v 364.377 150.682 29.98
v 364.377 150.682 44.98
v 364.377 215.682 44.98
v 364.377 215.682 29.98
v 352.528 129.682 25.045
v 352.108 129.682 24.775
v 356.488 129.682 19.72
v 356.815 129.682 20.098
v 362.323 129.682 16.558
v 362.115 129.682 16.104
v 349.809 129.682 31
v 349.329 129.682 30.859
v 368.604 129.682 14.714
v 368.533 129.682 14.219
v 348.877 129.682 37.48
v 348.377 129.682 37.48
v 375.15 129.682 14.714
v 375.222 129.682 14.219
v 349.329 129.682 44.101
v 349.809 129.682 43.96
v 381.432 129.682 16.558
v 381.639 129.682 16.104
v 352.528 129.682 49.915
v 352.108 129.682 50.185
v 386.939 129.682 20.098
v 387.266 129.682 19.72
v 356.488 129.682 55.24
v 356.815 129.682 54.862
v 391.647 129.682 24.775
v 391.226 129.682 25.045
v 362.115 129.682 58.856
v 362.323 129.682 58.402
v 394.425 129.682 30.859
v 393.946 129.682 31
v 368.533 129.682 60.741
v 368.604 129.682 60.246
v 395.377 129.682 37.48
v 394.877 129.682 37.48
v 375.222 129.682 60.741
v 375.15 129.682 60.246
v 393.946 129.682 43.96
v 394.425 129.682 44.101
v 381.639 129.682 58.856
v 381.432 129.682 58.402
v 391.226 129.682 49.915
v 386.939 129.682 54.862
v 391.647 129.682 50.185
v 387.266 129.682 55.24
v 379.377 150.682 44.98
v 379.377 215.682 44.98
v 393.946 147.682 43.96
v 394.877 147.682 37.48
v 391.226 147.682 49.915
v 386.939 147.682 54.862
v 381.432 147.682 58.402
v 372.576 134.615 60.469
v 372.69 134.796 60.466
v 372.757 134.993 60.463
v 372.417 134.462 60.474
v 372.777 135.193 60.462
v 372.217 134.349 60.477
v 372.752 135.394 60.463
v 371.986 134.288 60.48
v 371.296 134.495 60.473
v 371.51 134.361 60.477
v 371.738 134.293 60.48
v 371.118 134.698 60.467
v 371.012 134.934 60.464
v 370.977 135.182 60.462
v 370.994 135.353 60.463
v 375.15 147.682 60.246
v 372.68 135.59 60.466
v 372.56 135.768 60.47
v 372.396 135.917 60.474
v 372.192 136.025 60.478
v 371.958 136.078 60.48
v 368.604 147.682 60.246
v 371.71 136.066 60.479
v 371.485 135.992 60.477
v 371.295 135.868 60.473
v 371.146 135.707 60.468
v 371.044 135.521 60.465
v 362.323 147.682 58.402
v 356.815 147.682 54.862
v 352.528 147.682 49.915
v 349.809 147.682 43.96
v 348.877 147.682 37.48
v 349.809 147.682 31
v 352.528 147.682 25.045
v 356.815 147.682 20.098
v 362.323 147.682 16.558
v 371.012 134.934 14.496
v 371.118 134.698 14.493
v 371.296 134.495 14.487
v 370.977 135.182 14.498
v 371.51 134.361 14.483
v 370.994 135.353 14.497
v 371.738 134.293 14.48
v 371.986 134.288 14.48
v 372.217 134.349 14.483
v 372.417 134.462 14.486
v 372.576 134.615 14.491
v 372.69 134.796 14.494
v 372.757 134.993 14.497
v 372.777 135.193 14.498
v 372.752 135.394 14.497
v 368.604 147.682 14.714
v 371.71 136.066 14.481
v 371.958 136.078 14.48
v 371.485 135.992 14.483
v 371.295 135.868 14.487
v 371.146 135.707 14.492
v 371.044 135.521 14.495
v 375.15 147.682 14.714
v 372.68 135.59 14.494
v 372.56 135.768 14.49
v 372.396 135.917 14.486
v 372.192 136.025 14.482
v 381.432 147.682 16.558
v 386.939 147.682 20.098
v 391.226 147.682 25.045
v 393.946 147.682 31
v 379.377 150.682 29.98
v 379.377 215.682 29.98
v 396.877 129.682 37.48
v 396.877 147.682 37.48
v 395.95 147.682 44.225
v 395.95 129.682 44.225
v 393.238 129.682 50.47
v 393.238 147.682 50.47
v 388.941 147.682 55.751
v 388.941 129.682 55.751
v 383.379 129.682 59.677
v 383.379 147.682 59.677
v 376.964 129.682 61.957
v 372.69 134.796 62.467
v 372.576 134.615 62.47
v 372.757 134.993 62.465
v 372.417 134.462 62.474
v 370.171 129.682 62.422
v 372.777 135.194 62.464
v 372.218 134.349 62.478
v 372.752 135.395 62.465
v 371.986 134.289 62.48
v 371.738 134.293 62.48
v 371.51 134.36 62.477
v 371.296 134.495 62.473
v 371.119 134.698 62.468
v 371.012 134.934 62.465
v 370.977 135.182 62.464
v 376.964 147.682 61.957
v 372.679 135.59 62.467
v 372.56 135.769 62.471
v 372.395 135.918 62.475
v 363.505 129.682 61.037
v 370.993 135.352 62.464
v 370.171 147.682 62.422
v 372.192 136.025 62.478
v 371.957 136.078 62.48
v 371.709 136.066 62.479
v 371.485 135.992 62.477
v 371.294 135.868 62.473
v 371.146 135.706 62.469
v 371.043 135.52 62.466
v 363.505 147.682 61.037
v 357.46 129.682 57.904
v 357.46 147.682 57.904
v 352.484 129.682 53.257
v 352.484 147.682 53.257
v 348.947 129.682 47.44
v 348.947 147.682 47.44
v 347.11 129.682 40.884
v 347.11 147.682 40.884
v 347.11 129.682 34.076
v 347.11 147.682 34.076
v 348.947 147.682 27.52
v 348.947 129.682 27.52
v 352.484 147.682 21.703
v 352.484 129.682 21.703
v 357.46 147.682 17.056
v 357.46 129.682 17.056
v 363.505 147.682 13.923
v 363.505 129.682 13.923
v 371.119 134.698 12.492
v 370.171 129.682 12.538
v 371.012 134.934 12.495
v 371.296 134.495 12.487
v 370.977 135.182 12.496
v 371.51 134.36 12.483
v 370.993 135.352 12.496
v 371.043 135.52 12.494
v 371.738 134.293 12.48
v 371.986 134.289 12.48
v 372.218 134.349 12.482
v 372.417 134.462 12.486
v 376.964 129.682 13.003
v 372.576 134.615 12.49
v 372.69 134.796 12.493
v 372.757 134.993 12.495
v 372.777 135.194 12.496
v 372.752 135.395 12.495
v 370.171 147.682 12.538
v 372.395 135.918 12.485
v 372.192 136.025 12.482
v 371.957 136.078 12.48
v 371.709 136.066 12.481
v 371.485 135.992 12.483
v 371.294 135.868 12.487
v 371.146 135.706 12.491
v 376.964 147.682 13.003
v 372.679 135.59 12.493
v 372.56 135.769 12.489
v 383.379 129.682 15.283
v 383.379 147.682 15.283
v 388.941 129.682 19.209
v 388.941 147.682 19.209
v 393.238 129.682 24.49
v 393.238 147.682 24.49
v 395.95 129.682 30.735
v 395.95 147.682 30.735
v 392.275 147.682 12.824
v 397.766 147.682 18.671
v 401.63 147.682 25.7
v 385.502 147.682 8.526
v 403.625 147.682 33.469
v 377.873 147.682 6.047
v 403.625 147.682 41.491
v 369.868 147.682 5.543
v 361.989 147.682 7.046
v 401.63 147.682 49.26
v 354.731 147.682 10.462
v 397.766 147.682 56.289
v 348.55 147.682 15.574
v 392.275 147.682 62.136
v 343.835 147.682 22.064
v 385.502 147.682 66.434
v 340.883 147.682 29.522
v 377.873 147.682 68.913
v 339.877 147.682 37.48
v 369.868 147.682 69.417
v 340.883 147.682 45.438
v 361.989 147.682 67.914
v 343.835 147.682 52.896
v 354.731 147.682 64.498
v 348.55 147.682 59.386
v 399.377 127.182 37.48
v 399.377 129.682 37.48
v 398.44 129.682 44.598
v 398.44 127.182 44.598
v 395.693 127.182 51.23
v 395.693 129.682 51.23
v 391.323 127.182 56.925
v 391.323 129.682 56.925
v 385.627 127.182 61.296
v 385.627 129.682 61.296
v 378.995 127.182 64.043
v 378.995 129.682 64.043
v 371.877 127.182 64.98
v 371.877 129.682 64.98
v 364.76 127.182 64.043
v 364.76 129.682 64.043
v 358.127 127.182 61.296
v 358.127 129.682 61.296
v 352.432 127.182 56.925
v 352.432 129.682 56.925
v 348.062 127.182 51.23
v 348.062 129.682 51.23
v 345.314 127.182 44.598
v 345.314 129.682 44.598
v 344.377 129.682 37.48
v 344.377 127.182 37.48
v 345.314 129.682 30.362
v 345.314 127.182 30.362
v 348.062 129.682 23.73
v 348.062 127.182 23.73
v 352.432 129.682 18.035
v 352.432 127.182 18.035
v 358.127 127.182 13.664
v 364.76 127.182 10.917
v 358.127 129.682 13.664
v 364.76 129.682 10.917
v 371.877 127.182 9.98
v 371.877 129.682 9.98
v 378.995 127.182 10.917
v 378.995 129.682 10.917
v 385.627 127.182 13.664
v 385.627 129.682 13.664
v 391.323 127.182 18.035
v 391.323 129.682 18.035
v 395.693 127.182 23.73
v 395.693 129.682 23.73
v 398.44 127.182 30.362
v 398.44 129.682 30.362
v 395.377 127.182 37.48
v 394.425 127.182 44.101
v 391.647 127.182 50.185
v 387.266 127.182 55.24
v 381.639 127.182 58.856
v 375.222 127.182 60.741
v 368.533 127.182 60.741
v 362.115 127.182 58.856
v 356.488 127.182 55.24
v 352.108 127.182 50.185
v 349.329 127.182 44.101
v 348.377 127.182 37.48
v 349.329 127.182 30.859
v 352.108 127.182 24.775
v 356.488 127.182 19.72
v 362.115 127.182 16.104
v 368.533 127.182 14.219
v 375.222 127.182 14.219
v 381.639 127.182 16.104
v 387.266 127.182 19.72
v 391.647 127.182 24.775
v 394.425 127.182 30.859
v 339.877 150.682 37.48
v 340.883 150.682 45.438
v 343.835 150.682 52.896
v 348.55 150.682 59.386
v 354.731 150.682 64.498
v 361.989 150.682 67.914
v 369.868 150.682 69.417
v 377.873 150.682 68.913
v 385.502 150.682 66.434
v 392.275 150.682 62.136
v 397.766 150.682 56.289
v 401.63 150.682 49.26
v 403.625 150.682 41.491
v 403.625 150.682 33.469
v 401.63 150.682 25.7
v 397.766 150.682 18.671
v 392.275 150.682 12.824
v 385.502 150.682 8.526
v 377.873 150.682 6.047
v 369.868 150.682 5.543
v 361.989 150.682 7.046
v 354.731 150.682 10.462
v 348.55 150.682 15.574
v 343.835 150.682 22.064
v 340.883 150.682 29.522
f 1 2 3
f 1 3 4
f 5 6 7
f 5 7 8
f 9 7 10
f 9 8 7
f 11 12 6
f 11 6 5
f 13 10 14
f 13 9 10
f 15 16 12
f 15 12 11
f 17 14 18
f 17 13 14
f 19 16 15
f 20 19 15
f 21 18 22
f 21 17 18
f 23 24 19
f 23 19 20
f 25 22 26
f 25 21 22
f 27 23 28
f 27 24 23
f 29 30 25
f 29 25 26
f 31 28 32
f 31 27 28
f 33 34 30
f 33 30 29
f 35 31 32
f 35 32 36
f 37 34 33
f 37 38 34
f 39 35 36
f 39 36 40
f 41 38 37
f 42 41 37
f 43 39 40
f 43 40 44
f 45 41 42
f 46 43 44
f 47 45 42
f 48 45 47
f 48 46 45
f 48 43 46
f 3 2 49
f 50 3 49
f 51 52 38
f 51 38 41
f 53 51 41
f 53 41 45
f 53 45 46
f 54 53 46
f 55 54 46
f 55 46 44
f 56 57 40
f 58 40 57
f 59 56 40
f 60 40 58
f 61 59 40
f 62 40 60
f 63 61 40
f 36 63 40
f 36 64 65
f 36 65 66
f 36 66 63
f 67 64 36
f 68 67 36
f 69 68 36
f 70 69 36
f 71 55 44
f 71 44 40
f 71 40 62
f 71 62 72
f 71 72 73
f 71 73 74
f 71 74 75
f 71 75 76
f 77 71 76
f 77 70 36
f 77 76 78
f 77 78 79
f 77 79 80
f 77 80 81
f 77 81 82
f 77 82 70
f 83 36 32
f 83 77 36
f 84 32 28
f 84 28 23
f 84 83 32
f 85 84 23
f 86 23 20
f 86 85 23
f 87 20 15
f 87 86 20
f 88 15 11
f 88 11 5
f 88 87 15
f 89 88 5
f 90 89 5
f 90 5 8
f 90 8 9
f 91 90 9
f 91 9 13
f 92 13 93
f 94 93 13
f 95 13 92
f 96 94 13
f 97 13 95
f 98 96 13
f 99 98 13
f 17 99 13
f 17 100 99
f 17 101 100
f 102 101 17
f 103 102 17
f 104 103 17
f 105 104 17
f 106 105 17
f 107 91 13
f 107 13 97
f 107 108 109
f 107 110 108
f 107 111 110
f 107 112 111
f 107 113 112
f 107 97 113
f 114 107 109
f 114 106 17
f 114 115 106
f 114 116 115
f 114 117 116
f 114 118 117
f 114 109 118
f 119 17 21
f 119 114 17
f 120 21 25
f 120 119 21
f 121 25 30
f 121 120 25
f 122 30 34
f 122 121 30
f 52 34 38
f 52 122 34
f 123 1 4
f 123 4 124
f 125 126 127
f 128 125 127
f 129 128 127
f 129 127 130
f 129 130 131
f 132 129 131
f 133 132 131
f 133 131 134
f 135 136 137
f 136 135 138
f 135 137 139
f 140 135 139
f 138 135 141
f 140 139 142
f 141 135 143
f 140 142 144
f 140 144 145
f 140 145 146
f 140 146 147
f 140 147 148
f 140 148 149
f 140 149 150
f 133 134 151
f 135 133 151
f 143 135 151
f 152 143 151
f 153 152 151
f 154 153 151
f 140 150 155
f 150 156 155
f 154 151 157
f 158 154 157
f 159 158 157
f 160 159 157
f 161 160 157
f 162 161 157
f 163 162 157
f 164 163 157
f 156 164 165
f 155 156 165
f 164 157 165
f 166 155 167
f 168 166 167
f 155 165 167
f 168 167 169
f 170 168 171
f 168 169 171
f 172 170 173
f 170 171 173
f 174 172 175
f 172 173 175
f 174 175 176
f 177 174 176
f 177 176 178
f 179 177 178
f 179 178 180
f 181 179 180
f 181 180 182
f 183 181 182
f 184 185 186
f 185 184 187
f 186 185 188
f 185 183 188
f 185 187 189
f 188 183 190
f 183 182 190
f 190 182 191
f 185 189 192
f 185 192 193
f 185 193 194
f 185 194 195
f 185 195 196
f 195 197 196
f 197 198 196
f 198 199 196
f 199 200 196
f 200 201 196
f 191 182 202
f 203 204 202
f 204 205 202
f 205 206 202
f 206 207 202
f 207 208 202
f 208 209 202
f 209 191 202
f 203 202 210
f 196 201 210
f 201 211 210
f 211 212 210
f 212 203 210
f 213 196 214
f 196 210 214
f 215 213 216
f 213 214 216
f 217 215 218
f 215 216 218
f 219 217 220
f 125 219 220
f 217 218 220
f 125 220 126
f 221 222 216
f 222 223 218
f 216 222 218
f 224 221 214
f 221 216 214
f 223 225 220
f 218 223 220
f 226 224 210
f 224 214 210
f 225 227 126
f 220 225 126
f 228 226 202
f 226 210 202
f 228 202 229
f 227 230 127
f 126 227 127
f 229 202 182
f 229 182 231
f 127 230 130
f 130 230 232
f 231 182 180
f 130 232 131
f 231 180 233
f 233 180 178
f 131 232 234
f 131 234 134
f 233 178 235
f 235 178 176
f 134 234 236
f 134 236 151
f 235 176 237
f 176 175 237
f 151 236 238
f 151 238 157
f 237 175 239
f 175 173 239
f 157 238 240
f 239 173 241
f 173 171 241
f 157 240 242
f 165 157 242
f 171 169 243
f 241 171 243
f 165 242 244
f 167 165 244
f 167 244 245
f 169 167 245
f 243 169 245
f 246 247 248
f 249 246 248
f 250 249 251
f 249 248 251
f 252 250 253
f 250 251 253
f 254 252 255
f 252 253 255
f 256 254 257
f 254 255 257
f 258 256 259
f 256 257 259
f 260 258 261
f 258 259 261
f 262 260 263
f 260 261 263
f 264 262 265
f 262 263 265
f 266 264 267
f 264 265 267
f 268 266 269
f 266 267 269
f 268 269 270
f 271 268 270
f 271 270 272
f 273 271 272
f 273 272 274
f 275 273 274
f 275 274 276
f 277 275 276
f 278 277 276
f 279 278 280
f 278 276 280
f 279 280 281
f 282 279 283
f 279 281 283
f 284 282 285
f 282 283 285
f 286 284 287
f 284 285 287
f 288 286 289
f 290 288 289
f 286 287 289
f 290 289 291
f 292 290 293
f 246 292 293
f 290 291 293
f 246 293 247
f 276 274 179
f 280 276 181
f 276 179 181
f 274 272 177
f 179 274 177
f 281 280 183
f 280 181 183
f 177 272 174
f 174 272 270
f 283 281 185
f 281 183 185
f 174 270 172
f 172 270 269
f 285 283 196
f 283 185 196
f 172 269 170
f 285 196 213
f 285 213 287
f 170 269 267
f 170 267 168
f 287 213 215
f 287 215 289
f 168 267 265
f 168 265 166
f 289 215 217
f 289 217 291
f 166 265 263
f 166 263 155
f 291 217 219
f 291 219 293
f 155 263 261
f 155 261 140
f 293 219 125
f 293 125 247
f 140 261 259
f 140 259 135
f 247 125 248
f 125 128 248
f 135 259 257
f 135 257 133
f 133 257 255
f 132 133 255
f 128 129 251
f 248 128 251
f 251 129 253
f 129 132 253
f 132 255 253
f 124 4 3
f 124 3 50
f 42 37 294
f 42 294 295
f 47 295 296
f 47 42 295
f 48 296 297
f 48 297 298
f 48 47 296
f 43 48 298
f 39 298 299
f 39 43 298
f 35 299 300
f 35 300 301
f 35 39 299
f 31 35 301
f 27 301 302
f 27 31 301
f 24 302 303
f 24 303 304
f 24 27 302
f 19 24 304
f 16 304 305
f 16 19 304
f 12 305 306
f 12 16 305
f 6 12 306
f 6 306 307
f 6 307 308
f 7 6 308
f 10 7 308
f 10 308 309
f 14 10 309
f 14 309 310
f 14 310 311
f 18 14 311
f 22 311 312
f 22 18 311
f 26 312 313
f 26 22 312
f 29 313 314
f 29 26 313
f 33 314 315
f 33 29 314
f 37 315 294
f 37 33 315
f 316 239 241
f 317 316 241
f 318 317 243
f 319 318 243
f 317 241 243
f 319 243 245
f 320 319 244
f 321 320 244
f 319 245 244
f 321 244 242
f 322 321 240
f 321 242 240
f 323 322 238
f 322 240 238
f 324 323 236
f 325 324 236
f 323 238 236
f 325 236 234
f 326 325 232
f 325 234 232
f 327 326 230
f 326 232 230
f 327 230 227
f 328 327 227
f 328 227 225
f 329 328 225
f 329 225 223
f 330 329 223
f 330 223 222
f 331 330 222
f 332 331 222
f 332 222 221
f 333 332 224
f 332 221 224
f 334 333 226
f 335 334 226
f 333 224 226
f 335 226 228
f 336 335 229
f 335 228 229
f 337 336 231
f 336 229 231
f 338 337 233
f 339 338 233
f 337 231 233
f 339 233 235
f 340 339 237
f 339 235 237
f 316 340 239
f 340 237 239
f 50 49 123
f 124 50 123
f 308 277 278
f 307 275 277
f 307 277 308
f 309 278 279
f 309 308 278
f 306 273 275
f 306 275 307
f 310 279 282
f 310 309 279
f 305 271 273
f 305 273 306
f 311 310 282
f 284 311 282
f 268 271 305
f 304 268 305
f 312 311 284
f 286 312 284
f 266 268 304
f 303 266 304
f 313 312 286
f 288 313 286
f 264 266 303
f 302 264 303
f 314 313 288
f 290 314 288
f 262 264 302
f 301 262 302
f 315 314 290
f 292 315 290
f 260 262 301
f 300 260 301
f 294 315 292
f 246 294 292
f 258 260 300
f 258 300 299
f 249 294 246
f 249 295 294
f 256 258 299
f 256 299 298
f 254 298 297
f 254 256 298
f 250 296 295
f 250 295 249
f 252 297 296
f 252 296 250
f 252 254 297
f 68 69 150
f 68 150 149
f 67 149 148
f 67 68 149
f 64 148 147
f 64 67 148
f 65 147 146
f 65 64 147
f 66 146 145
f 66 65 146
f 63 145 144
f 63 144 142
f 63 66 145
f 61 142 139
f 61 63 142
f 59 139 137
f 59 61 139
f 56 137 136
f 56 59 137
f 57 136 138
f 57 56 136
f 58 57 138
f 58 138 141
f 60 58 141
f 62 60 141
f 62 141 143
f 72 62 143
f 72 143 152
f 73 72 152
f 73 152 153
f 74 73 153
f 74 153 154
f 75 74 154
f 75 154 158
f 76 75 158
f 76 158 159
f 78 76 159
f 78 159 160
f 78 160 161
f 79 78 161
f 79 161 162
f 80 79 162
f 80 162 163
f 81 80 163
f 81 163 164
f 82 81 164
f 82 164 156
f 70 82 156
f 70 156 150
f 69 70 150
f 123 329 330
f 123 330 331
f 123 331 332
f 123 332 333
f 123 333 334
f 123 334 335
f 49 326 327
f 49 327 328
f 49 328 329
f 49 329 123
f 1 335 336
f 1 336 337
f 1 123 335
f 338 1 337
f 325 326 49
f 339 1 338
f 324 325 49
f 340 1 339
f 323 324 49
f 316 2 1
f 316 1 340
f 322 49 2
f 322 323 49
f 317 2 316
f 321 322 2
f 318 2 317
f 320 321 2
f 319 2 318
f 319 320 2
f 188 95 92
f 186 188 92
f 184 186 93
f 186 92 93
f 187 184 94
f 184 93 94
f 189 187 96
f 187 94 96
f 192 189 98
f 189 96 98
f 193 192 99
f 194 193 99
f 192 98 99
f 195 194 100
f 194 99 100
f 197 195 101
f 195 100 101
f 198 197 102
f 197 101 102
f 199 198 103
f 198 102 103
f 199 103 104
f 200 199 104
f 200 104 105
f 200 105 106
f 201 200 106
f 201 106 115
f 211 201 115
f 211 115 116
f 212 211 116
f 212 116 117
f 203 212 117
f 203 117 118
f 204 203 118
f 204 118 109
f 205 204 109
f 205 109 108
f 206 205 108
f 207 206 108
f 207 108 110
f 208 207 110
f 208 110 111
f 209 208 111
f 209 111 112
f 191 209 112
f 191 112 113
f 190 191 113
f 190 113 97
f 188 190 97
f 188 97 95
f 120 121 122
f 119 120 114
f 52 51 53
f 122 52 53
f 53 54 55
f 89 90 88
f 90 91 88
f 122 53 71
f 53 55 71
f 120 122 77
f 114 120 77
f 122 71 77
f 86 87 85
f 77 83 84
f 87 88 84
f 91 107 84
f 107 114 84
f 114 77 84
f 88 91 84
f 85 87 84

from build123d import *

# Parameters (mm, degrees)
SKETCH2_W               = 5
SKETCH2_H               = 74.664160083
SKETCH2_W_2             = 10
SKETCH2_H_2             = 5
SKETCH2_R               = 1.15
BOSS_EXTRUDE1_DEPTH     = 1.5
SKETCH3_W               = 13
SKETCH3_H               = 74.664160083
BOSS_EXTRUDE2_DEPTH     = 1
SKETCH5_W               = 97.96
SKETCH5_H               = 74.648794292
BOSS_EXTRUDE3_DEPTH     = 1
SKETCH6_R               = 25
SKETCH6_R_2             = 23
BOSS_EXTRUDE4_DEPTH     = 18
SKETCH8_R               = 27.5
SKETCH8_R_2             = 23.5
BOSS_EXTRUDE6_DEPTH     = 2.5
SKETCH13_W              = 18
SKETCH13_H              = 23
BOSS_EXTRUDE7_DEPTH     = 1
SKETCH15_R              = 3.75
CUT_EXTRUDE3_DEPTH      = 1
BODY_MOVE_COPY2_ANGLE   = 90
SKETCH16_R              = 3.75
BOSS_EXTRUDE8_DEPTH     = 6
SKETCH17_R              = 0.9
CUT_EXTRUDE4_DEPTH      = 46
CUT_EXTRUDE4_DEPTH_BACK = 44
SKETCH18_W              = 142.524598678
SKETCH18_H              = 112.115255427
CUT_EXTRUDE5_DEPTH      = 7
SKETCH20_R              = 32
BOSS_EXTRUDE9_DEPTH     = 3
SKETCH23_W              = 15
SKETCH23_H              = 15
BOSS_EXTRUDE11_DEPTH    = 65


with BuildPart() as part:
    # Sketch2 → Boss-Extrude1 (new body)
    with BuildSketch(Plane.XY):
        with Locations((376.369557123, 140.674264472)):
            Rectangle(SKETCH2_W, SKETCH2_H)
        with Locations((368.869557123, 175.506344513)):
            Rectangle(SKETCH2_W_2, SKETCH2_H_2)
        with Locations((366.369557123, 175.506344513)):
            Circle(SKETCH2_R, mode=Mode.SUBTRACT)
        with Locations((368.869557123, 105.84218443)):
            Rectangle(SKETCH2_W_2, SKETCH2_H_2)
        with Locations((366.369557123, 105.84218443)):
            Circle(SKETCH2_R, mode=Mode.SUBTRACT)
    boss_extrude1 = extrude(amount=BOSS_EXTRUDE1_DEPTH)

    # Sketch3 → Boss-Extrude2 (add)
    with BuildSketch(Plane(origin=(378.869557123, 0, 0), x_dir=(0, 0, -1), z_dir=(1, 0, 0))):
        with Locations((5, 140.674264472)):
            Rectangle(SKETCH3_W, SKETCH3_H)
    extrude(amount=BOSS_EXTRUDE2_DEPTH)

    # Mirror3: Boss-Extrude1 across plane
    add(boss_extrude1.mirror(Plane(origin=(0, 0, -5), x_dir=(1, 0, 0), z_dir=(0, 0, -1))))


with BuildPart() as body_2:
    # Body-Move/Copy1: copy of part
    add(part.part.moved(Location((0, 0, 84.96))))


with BuildPart() as part_1:
    add(part.part)

    add(body_2.part)  # Boss-Extrude3 merges body 2
    # Sketch5 → Boss-Extrude3 (add)
    with BuildSketch(Plane(origin=(379.869557123, 0, 0), x_dir=(0, 0, -1), z_dir=(1, 0, 0))):
        with Locations((-37.48, 140.681947367)):
            Rectangle(SKETCH5_W, SKETCH5_H)
    extrude(amount=-BOSS_EXTRUDE3_DEPTH)

    # Sketch6 → Boss-Extrude4 (add)
    with BuildSketch(Plane.ZY.offset(-378.869557123)):
        with Locations(Location((37.48, 140.674264472, 0), (0, 0, 270))):
            Circle(SKETCH6_R)
        with Locations(Location((37.48, 140.674264472, 0), (0, 0, 270))):
            Circle(SKETCH6_R_2, mode=Mode.SUBTRACT)
    extrude(amount=BOSS_EXTRUDE4_DEPTH)

    # Sketch8 → Boss-Extrude6 (add)
    with BuildSketch(Plane.ZY.offset(-360.869557123)):
        with Locations(Location((37.48, 140.674264472, 0), (0, 0, 270))):
            Circle(SKETCH8_R)
        with Locations(Location((37.48, 140.674264472, 0), (0, 0, 270))):
            Circle(SKETCH8_R_2, mode=Mode.SUBTRACT)
    extrude(amount=BOSS_EXTRUDE6_DEPTH)

    # Sketch13 → Boss-Extrude7 (add)
    with BuildSketch(Plane.ZY.offset(-378.869557123)):
        with Locations((37.48, 189.506344513)):
            Rectangle(SKETCH13_W, SKETCH13_H)
        with Locations((37.48, 91.857550221)):
            Rectangle(SKETCH13_W, SKETCH13_H)
    extrude(amount=-BOSS_EXTRUDE7_DEPTH)

    # Sketch15 → Cut-Extrude3 (cut)
    with BuildSketch(Plane.ZY.offset(-378.869557123)):
        with Locations(Location((37.48, 195.006344513, 0), (0, 0, 270))):
            Circle(SKETCH15_R)
        with Locations(Location((37.48, 86.357550221, 0), (0, 0, 270))):
            Circle(SKETCH15_R)
    extrude(amount=-CUT_EXTRUDE3_DEPTH, mode=Mode.SUBTRACT)


with BuildPart() as part_2:
    # Body-Move/Copy2: moved
    add(part_1.part.rotate(Axis((371.869557123, 140.681947367, 0), (0, 0, 1)), BODY_MOVE_COPY2_ANGLE))

    # Sketch16 → Boss-Extrude8 (add)
    with BuildSketch(Plane(origin=(0, 148.681947367, 0), x_dir=(1, 0, 0), z_dir=(0, 1, 0))):
        Polygon((334.545159977, -28.48), (334.545159977, 11.5), (409.20932006, 11.5), (409.193954269, -28.48), (432.193954269, -28.48), (432.193954269, -46.48), (409.193954269, -46.48), (409.20932006, -86.46), (334.545159977, -86.46), (334.545159977, -46.48), (311.545159977, -46.48), (311.545159977, -28.48), align=None)
        with Locations((317.545159977, -37.48)):
            Circle(SKETCH16_R, mode=Mode.SUBTRACT)
        with Locations((426.193954269, -37.48)):
            Circle(SKETCH16_R, mode=Mode.SUBTRACT)
    extrude(amount=BOSS_EXTRUDE8_DEPTH)

    # Sketch17 → Cut-Extrude4 (cut, two sides)
    with BuildSketch(Plane.XY.offset(37.48)) as cut_extrude4_sk:
        with Locations(Location((371.877240018, 135.181947367, 0), (0, 0, 180))):
            Circle(SKETCH17_R)
    extrude(amount=CUT_EXTRUDE4_DEPTH, mode=Mode.SUBTRACT)
    extrude(cut_extrude4_sk.sketch, amount=-CUT_EXTRUDE4_DEPTH_BACK, mode=Mode.SUBTRACT)

    # Sketch18 → Cut-Extrude5 (cut)
    with BuildSketch(Plane(origin=(0, 154.681947367, 0), x_dir=(1, 0, 0), z_dir=(0, 1, 0))):
        with Locations((368.644323748, -41.089189729)):
            Rectangle(SKETCH18_W, SKETCH18_H)
    extrude(amount=-CUT_EXTRUDE5_DEPTH, mode=Mode.SUBTRACT)


with BuildPart() as body_2_2:
    # of the pieces the cut leaves, the one that is kept (cut_extrude5_keep)
    add(part_2.part.solids().sort_by_distance((396.877240018, 147.681947367, 37.48))[0])

    # Sketch20 → Boss-Extrude9 (add)
    with BuildSketch(Plane(origin=(0, 147.681947367, 0), x_dir=(1, 0, 0), z_dir=(0, 1, 0))):
        with Locations(Location((371.877240018, -37.48, 0), (0, 0, 180))):
            Circle(SKETCH20_R)
    extrude(amount=BOSS_EXTRUDE9_DEPTH)

    # Sketch23 → Boss-Extrude11 (add)
    with BuildSketch(Plane(origin=(0, 150.681947367, 0), x_dir=(1, 0, 0), z_dir=(0, 1, 0))):
        with Locations((371.877240018, -37.48)):
            Rectangle(SKETCH23_W, SKETCH23_H)
    extrude(amount=BOSS_EXTRUDE11_DEPTH)


solid = body_2_2.part
